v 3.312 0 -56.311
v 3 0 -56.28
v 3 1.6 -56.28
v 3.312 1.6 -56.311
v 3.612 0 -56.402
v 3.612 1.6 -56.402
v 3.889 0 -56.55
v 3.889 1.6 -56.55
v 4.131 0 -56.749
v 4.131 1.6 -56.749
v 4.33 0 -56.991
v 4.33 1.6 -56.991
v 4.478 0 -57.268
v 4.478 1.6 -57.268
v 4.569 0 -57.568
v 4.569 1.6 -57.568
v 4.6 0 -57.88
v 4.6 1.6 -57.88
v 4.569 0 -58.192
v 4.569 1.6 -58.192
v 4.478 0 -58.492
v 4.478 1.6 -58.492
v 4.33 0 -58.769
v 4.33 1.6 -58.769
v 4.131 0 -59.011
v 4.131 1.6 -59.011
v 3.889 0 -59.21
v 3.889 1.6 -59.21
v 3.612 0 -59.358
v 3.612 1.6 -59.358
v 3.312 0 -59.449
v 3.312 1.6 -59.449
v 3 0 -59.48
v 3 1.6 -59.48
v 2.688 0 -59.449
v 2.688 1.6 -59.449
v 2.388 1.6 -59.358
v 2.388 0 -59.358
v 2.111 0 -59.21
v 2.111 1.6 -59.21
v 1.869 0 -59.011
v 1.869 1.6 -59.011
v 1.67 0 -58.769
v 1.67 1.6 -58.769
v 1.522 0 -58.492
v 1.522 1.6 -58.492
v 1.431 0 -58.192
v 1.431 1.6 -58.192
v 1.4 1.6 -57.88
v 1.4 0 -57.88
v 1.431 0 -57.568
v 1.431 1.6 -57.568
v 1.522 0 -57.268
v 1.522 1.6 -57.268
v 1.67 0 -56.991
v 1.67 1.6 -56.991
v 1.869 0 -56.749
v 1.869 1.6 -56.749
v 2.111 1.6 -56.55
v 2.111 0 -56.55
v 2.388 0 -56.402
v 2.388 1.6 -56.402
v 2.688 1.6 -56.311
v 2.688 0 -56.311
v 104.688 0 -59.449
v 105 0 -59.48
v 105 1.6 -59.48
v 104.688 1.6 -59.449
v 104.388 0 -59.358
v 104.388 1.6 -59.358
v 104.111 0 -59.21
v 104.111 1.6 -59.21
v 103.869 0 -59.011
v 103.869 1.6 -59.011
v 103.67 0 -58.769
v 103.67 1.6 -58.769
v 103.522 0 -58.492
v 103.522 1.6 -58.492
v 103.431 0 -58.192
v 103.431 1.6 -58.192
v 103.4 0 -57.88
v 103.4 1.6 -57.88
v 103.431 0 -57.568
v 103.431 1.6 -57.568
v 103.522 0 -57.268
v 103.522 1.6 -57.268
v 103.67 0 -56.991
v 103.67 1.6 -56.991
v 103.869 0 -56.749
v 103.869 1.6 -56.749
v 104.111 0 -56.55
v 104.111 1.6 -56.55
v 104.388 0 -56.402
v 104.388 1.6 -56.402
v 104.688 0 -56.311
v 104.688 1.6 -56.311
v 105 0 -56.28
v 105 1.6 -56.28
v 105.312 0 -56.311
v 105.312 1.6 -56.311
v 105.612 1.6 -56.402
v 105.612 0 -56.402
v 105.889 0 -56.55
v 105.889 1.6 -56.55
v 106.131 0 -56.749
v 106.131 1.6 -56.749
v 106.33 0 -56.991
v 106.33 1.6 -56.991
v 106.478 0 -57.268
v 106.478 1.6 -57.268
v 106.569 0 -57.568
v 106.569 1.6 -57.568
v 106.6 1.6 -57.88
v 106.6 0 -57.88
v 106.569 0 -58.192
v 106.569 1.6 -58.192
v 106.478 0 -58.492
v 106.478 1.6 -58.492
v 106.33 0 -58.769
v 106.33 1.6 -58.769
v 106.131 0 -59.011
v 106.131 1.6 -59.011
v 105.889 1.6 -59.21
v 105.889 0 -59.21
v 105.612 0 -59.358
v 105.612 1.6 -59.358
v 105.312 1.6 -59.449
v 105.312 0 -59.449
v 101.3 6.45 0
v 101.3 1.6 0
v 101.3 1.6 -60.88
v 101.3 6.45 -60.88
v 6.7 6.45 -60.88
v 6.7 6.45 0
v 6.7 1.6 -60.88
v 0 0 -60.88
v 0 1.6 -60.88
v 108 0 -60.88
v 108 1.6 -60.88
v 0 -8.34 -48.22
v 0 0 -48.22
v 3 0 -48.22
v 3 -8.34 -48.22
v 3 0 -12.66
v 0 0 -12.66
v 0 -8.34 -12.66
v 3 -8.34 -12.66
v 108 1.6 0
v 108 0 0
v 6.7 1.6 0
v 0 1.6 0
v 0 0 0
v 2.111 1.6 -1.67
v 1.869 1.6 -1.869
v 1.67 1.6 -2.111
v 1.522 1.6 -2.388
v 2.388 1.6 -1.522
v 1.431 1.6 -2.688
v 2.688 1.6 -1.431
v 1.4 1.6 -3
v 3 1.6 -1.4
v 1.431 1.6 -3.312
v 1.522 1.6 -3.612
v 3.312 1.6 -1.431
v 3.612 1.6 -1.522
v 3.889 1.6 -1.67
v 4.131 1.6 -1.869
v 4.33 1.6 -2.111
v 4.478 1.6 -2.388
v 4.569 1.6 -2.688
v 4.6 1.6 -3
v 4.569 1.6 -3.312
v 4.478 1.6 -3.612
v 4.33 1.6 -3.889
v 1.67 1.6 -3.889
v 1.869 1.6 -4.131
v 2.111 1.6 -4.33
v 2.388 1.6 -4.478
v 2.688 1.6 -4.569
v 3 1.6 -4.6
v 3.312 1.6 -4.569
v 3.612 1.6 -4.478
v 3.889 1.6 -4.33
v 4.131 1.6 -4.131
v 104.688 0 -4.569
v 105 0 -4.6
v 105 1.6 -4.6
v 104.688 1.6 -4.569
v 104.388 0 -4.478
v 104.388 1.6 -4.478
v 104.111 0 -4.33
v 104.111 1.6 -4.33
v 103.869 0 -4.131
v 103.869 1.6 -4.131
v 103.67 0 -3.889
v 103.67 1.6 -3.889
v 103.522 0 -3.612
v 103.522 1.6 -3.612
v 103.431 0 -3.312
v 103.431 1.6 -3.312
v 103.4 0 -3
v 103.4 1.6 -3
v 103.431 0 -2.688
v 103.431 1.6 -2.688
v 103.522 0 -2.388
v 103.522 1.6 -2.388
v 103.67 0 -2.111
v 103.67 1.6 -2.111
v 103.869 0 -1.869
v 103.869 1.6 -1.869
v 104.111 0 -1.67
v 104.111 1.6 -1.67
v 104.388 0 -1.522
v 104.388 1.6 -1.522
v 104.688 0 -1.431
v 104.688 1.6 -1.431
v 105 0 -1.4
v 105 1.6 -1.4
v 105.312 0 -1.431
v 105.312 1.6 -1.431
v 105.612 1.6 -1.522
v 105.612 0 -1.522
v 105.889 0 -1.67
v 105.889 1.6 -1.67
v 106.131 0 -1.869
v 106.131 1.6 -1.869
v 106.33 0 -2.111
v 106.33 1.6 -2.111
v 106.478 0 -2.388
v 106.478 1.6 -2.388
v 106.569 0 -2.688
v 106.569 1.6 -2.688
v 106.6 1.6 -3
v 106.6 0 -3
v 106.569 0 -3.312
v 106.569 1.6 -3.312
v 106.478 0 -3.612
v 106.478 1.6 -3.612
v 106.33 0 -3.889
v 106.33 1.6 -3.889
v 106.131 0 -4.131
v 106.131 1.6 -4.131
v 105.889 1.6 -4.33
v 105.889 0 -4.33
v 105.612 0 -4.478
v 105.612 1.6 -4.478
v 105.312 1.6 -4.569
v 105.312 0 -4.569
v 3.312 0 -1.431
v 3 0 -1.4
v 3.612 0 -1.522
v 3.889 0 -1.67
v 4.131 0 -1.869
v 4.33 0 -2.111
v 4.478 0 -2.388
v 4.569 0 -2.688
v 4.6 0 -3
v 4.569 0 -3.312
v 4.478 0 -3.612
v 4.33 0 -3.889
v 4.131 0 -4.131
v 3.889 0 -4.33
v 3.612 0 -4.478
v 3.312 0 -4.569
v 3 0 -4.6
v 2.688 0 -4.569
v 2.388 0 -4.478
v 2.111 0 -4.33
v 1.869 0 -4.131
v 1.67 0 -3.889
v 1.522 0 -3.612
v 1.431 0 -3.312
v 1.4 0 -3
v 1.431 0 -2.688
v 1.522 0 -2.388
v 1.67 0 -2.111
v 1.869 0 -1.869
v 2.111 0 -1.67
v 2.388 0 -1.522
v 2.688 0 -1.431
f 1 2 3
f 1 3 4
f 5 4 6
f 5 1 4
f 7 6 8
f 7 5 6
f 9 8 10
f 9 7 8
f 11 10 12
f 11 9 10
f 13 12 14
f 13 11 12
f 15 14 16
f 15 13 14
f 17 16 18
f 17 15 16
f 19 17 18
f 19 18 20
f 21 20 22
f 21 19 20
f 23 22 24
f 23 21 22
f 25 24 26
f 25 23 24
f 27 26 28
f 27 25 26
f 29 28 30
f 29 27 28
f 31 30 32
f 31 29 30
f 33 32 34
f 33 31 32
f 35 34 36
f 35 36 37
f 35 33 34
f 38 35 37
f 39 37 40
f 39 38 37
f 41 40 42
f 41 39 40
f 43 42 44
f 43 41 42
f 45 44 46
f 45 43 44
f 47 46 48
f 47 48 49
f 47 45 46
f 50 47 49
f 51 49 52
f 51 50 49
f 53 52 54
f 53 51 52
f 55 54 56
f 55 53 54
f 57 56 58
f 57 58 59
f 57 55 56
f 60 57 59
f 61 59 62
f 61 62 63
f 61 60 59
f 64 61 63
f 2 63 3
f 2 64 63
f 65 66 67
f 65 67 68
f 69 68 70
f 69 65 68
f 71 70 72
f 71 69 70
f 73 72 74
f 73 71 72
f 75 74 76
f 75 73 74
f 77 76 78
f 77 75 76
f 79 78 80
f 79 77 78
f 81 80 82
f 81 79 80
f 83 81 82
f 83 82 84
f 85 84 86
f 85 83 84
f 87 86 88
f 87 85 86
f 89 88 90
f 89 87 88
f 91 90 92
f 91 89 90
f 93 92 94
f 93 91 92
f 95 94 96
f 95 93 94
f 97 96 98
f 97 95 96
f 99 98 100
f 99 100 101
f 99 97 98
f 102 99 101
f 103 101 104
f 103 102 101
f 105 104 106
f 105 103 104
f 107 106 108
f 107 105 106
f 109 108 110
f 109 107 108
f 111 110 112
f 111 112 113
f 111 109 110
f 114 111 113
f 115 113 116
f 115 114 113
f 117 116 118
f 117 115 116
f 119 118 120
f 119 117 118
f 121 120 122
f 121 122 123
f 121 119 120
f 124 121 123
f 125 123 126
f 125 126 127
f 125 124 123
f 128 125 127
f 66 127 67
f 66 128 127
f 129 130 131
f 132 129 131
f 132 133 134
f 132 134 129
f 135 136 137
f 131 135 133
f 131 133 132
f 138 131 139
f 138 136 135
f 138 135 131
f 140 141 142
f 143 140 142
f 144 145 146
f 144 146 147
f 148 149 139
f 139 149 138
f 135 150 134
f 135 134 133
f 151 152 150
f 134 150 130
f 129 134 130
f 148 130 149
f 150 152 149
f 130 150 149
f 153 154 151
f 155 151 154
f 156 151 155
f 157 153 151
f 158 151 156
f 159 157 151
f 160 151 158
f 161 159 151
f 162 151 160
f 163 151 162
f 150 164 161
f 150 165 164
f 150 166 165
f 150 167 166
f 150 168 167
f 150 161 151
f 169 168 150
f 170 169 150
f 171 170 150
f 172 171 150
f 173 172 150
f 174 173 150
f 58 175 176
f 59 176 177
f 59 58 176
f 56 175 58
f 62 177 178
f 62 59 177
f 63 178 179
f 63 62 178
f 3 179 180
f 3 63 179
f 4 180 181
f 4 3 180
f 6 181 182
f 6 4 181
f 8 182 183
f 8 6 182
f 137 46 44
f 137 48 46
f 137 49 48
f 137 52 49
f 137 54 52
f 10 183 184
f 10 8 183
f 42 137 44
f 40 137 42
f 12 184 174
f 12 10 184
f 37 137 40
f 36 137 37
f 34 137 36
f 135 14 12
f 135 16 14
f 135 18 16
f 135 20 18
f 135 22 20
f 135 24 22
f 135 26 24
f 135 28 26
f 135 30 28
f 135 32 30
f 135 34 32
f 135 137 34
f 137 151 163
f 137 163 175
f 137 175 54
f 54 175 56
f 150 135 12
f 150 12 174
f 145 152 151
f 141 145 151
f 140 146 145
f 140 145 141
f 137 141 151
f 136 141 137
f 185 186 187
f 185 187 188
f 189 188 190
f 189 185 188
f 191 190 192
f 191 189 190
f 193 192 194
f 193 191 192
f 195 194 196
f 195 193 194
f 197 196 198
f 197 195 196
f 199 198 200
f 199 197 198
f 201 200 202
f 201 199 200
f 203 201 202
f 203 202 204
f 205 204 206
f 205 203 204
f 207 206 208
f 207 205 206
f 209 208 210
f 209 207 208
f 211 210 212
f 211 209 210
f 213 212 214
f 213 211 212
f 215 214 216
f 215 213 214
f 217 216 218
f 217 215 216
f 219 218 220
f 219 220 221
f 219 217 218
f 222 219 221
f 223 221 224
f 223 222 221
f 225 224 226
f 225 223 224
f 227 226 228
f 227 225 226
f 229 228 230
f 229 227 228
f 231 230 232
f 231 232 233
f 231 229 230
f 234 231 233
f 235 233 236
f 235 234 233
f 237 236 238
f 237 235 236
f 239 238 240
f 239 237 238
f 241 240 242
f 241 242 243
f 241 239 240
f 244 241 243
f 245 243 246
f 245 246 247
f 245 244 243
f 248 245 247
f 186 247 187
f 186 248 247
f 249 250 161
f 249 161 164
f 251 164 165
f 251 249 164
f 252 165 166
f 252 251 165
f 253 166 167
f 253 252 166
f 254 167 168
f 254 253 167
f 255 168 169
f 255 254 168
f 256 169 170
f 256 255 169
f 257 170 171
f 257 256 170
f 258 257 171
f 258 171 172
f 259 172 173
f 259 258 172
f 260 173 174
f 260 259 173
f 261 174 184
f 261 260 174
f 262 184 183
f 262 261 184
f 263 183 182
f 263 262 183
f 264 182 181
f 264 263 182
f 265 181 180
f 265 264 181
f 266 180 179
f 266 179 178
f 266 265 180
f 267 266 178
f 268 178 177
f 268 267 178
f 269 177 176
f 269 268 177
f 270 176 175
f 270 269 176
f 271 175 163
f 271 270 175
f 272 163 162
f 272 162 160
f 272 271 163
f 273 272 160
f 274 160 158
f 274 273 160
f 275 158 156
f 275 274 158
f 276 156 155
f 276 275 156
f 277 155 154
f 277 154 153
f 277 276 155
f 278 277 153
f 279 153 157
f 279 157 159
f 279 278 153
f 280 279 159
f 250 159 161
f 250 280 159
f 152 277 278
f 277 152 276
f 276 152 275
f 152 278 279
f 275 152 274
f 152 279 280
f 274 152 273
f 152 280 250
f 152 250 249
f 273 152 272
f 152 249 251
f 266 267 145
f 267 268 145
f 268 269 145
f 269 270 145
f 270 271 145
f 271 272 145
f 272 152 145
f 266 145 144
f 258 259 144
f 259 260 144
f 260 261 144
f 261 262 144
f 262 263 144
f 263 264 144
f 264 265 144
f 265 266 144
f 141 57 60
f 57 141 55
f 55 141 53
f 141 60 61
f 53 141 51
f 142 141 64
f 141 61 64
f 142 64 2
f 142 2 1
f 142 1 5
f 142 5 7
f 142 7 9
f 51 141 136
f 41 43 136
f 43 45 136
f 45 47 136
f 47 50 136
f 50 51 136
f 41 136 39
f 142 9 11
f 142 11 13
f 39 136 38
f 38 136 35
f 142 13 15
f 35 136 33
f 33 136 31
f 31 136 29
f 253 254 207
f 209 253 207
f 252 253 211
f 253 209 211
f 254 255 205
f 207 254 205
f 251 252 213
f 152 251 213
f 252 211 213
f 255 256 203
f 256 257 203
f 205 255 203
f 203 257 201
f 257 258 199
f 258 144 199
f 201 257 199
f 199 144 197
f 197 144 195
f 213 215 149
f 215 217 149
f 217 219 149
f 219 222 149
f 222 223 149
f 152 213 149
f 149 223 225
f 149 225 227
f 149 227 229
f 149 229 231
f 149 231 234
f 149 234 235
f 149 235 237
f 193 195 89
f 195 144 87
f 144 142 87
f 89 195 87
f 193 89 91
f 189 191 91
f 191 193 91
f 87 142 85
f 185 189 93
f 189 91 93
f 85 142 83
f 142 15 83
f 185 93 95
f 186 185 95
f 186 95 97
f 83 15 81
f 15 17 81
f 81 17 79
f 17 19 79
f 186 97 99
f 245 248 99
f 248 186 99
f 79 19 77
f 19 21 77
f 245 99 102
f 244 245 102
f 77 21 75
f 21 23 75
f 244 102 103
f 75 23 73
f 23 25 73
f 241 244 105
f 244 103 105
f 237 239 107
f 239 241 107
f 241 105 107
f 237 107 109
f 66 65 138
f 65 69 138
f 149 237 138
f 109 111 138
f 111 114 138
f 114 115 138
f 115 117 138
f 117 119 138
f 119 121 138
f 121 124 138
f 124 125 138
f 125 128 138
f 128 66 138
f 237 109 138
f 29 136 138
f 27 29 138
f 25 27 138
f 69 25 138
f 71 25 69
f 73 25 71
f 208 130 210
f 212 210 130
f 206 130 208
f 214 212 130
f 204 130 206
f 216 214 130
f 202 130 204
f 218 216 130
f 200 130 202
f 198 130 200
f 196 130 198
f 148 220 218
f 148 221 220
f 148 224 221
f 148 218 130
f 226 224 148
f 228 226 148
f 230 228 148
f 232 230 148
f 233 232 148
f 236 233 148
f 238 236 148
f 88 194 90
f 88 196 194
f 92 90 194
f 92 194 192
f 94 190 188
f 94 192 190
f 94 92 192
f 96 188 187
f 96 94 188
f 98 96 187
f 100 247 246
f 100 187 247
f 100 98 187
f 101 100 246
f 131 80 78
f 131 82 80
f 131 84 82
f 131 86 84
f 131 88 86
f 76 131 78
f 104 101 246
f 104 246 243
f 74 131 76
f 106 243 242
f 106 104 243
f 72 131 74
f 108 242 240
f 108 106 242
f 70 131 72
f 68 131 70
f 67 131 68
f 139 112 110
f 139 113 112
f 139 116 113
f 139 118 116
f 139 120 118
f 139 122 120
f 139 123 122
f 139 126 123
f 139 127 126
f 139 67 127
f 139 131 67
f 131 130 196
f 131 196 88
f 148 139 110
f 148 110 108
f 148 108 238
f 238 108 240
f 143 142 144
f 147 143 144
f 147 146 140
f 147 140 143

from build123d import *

# Parameters (mm, degrees)
SKETCH_1_W      = 108
SKETCH_1_H      = 60.88
SKETCH_1_R      = 1.6
EXTRUDE_1_DEPTH = 1.6
SKETCH_2_W      = 94.6
SKETCH_2_H      = 60.88
EXTRUDE_2_DEPTH = 4.85
SKETCH_3_W      = 3
SKETCH_3_H      = 35.56
EXTRUDE_3_DEPTH = 8.34


with BuildPart() as part:
    # 草图1 → 凸台-拉伸1 (new body)
    with BuildSketch(Plane(origin=(0, 0, 0), x_dir=(1, 0, 0), z_dir=(0, 1, 0))):
        with Locations((54, 30.44)):
            Rectangle(SKETCH_1_W, SKETCH_1_H)
        with Locations(Location((3, 57.88, 0), (0, 0, 270))):
            Circle(SKETCH_1_R, mode=Mode.SUBTRACT)
        with Locations(Location((3, 3, 0), (0, 0, 270))):
            Circle(SKETCH_1_R, mode=Mode.SUBTRACT)
        with Locations(Location((105, 3, 0), (0, 0, 90))):
            Circle(SKETCH_1_R, mode=Mode.SUBTRACT)
        with Locations(Location((105, 57.88, 0), (0, 0, 90))):
            Circle(SKETCH_1_R, mode=Mode.SUBTRACT)
    extrude(amount=EXTRUDE_1_DEPTH)

    # 草图2 → 凸台-拉伸2 (add)
    with BuildSketch(Plane(origin=(0, 1.6, 0), x_dir=(1, 0, 0), z_dir=(0, 1, 0))):
        with Locations((54, 30.44)):
            Rectangle(SKETCH_2_W, SKETCH_2_H)
    extrude(amount=EXTRUDE_2_DEPTH)

    # 草图3 → 凸台-拉伸3 (add)
    with BuildSketch(Plane.XZ):
        with Locations((1.5, -30.44)):
            Rectangle(SKETCH_3_W, SKETCH_3_H)
    extrude(amount=EXTRUDE_3_DEPTH)


solid = part.part
